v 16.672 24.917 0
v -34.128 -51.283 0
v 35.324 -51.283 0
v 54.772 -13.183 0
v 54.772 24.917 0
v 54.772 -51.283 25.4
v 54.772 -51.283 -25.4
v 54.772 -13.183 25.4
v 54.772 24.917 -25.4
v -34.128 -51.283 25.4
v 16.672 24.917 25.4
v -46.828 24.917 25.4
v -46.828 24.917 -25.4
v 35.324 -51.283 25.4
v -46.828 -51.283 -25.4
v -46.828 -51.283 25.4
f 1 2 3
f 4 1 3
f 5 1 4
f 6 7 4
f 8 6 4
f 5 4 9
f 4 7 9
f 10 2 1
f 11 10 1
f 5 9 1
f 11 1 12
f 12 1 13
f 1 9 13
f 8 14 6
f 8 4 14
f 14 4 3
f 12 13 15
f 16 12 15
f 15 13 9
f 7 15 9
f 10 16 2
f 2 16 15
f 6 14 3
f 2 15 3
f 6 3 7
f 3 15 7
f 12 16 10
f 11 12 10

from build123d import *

# Parameters (mm, degrees)
F0_W     = 101.6
F0_H     = 76.2
F1_DEPTH = 25.4
F3_DEPTH = 25.4
F4_DEPTH = 25.4


with BuildPart() as f1:
    # F0 (on Top) → F1 (new body)
    with BuildSketch(Plane.XY):
        with Locations((3.972126, -13.183172)):
            Rectangle(F0_W, F0_H)
    extrude(amount=-F1_DEPTH)

    # F2 (on face) → F3 (join)
    with BuildSketch(Plane.XY):
        Polygon((-46.827874, -51.283172), (-34.127874, -51.283172), (16.672126, 24.916828), (-46.827874, 24.916828), align=None)
    extrude(amount=F3_DEPTH)

    # F2 (on face) → F4 (join)
    with BuildSketch(Plane.XY):
        Polygon((54.772126, -13.183172), (35.323564, -51.283172), (54.772126, -51.283172), align=None)
    extrude(amount=F4_DEPTH)


solid = f1.part
